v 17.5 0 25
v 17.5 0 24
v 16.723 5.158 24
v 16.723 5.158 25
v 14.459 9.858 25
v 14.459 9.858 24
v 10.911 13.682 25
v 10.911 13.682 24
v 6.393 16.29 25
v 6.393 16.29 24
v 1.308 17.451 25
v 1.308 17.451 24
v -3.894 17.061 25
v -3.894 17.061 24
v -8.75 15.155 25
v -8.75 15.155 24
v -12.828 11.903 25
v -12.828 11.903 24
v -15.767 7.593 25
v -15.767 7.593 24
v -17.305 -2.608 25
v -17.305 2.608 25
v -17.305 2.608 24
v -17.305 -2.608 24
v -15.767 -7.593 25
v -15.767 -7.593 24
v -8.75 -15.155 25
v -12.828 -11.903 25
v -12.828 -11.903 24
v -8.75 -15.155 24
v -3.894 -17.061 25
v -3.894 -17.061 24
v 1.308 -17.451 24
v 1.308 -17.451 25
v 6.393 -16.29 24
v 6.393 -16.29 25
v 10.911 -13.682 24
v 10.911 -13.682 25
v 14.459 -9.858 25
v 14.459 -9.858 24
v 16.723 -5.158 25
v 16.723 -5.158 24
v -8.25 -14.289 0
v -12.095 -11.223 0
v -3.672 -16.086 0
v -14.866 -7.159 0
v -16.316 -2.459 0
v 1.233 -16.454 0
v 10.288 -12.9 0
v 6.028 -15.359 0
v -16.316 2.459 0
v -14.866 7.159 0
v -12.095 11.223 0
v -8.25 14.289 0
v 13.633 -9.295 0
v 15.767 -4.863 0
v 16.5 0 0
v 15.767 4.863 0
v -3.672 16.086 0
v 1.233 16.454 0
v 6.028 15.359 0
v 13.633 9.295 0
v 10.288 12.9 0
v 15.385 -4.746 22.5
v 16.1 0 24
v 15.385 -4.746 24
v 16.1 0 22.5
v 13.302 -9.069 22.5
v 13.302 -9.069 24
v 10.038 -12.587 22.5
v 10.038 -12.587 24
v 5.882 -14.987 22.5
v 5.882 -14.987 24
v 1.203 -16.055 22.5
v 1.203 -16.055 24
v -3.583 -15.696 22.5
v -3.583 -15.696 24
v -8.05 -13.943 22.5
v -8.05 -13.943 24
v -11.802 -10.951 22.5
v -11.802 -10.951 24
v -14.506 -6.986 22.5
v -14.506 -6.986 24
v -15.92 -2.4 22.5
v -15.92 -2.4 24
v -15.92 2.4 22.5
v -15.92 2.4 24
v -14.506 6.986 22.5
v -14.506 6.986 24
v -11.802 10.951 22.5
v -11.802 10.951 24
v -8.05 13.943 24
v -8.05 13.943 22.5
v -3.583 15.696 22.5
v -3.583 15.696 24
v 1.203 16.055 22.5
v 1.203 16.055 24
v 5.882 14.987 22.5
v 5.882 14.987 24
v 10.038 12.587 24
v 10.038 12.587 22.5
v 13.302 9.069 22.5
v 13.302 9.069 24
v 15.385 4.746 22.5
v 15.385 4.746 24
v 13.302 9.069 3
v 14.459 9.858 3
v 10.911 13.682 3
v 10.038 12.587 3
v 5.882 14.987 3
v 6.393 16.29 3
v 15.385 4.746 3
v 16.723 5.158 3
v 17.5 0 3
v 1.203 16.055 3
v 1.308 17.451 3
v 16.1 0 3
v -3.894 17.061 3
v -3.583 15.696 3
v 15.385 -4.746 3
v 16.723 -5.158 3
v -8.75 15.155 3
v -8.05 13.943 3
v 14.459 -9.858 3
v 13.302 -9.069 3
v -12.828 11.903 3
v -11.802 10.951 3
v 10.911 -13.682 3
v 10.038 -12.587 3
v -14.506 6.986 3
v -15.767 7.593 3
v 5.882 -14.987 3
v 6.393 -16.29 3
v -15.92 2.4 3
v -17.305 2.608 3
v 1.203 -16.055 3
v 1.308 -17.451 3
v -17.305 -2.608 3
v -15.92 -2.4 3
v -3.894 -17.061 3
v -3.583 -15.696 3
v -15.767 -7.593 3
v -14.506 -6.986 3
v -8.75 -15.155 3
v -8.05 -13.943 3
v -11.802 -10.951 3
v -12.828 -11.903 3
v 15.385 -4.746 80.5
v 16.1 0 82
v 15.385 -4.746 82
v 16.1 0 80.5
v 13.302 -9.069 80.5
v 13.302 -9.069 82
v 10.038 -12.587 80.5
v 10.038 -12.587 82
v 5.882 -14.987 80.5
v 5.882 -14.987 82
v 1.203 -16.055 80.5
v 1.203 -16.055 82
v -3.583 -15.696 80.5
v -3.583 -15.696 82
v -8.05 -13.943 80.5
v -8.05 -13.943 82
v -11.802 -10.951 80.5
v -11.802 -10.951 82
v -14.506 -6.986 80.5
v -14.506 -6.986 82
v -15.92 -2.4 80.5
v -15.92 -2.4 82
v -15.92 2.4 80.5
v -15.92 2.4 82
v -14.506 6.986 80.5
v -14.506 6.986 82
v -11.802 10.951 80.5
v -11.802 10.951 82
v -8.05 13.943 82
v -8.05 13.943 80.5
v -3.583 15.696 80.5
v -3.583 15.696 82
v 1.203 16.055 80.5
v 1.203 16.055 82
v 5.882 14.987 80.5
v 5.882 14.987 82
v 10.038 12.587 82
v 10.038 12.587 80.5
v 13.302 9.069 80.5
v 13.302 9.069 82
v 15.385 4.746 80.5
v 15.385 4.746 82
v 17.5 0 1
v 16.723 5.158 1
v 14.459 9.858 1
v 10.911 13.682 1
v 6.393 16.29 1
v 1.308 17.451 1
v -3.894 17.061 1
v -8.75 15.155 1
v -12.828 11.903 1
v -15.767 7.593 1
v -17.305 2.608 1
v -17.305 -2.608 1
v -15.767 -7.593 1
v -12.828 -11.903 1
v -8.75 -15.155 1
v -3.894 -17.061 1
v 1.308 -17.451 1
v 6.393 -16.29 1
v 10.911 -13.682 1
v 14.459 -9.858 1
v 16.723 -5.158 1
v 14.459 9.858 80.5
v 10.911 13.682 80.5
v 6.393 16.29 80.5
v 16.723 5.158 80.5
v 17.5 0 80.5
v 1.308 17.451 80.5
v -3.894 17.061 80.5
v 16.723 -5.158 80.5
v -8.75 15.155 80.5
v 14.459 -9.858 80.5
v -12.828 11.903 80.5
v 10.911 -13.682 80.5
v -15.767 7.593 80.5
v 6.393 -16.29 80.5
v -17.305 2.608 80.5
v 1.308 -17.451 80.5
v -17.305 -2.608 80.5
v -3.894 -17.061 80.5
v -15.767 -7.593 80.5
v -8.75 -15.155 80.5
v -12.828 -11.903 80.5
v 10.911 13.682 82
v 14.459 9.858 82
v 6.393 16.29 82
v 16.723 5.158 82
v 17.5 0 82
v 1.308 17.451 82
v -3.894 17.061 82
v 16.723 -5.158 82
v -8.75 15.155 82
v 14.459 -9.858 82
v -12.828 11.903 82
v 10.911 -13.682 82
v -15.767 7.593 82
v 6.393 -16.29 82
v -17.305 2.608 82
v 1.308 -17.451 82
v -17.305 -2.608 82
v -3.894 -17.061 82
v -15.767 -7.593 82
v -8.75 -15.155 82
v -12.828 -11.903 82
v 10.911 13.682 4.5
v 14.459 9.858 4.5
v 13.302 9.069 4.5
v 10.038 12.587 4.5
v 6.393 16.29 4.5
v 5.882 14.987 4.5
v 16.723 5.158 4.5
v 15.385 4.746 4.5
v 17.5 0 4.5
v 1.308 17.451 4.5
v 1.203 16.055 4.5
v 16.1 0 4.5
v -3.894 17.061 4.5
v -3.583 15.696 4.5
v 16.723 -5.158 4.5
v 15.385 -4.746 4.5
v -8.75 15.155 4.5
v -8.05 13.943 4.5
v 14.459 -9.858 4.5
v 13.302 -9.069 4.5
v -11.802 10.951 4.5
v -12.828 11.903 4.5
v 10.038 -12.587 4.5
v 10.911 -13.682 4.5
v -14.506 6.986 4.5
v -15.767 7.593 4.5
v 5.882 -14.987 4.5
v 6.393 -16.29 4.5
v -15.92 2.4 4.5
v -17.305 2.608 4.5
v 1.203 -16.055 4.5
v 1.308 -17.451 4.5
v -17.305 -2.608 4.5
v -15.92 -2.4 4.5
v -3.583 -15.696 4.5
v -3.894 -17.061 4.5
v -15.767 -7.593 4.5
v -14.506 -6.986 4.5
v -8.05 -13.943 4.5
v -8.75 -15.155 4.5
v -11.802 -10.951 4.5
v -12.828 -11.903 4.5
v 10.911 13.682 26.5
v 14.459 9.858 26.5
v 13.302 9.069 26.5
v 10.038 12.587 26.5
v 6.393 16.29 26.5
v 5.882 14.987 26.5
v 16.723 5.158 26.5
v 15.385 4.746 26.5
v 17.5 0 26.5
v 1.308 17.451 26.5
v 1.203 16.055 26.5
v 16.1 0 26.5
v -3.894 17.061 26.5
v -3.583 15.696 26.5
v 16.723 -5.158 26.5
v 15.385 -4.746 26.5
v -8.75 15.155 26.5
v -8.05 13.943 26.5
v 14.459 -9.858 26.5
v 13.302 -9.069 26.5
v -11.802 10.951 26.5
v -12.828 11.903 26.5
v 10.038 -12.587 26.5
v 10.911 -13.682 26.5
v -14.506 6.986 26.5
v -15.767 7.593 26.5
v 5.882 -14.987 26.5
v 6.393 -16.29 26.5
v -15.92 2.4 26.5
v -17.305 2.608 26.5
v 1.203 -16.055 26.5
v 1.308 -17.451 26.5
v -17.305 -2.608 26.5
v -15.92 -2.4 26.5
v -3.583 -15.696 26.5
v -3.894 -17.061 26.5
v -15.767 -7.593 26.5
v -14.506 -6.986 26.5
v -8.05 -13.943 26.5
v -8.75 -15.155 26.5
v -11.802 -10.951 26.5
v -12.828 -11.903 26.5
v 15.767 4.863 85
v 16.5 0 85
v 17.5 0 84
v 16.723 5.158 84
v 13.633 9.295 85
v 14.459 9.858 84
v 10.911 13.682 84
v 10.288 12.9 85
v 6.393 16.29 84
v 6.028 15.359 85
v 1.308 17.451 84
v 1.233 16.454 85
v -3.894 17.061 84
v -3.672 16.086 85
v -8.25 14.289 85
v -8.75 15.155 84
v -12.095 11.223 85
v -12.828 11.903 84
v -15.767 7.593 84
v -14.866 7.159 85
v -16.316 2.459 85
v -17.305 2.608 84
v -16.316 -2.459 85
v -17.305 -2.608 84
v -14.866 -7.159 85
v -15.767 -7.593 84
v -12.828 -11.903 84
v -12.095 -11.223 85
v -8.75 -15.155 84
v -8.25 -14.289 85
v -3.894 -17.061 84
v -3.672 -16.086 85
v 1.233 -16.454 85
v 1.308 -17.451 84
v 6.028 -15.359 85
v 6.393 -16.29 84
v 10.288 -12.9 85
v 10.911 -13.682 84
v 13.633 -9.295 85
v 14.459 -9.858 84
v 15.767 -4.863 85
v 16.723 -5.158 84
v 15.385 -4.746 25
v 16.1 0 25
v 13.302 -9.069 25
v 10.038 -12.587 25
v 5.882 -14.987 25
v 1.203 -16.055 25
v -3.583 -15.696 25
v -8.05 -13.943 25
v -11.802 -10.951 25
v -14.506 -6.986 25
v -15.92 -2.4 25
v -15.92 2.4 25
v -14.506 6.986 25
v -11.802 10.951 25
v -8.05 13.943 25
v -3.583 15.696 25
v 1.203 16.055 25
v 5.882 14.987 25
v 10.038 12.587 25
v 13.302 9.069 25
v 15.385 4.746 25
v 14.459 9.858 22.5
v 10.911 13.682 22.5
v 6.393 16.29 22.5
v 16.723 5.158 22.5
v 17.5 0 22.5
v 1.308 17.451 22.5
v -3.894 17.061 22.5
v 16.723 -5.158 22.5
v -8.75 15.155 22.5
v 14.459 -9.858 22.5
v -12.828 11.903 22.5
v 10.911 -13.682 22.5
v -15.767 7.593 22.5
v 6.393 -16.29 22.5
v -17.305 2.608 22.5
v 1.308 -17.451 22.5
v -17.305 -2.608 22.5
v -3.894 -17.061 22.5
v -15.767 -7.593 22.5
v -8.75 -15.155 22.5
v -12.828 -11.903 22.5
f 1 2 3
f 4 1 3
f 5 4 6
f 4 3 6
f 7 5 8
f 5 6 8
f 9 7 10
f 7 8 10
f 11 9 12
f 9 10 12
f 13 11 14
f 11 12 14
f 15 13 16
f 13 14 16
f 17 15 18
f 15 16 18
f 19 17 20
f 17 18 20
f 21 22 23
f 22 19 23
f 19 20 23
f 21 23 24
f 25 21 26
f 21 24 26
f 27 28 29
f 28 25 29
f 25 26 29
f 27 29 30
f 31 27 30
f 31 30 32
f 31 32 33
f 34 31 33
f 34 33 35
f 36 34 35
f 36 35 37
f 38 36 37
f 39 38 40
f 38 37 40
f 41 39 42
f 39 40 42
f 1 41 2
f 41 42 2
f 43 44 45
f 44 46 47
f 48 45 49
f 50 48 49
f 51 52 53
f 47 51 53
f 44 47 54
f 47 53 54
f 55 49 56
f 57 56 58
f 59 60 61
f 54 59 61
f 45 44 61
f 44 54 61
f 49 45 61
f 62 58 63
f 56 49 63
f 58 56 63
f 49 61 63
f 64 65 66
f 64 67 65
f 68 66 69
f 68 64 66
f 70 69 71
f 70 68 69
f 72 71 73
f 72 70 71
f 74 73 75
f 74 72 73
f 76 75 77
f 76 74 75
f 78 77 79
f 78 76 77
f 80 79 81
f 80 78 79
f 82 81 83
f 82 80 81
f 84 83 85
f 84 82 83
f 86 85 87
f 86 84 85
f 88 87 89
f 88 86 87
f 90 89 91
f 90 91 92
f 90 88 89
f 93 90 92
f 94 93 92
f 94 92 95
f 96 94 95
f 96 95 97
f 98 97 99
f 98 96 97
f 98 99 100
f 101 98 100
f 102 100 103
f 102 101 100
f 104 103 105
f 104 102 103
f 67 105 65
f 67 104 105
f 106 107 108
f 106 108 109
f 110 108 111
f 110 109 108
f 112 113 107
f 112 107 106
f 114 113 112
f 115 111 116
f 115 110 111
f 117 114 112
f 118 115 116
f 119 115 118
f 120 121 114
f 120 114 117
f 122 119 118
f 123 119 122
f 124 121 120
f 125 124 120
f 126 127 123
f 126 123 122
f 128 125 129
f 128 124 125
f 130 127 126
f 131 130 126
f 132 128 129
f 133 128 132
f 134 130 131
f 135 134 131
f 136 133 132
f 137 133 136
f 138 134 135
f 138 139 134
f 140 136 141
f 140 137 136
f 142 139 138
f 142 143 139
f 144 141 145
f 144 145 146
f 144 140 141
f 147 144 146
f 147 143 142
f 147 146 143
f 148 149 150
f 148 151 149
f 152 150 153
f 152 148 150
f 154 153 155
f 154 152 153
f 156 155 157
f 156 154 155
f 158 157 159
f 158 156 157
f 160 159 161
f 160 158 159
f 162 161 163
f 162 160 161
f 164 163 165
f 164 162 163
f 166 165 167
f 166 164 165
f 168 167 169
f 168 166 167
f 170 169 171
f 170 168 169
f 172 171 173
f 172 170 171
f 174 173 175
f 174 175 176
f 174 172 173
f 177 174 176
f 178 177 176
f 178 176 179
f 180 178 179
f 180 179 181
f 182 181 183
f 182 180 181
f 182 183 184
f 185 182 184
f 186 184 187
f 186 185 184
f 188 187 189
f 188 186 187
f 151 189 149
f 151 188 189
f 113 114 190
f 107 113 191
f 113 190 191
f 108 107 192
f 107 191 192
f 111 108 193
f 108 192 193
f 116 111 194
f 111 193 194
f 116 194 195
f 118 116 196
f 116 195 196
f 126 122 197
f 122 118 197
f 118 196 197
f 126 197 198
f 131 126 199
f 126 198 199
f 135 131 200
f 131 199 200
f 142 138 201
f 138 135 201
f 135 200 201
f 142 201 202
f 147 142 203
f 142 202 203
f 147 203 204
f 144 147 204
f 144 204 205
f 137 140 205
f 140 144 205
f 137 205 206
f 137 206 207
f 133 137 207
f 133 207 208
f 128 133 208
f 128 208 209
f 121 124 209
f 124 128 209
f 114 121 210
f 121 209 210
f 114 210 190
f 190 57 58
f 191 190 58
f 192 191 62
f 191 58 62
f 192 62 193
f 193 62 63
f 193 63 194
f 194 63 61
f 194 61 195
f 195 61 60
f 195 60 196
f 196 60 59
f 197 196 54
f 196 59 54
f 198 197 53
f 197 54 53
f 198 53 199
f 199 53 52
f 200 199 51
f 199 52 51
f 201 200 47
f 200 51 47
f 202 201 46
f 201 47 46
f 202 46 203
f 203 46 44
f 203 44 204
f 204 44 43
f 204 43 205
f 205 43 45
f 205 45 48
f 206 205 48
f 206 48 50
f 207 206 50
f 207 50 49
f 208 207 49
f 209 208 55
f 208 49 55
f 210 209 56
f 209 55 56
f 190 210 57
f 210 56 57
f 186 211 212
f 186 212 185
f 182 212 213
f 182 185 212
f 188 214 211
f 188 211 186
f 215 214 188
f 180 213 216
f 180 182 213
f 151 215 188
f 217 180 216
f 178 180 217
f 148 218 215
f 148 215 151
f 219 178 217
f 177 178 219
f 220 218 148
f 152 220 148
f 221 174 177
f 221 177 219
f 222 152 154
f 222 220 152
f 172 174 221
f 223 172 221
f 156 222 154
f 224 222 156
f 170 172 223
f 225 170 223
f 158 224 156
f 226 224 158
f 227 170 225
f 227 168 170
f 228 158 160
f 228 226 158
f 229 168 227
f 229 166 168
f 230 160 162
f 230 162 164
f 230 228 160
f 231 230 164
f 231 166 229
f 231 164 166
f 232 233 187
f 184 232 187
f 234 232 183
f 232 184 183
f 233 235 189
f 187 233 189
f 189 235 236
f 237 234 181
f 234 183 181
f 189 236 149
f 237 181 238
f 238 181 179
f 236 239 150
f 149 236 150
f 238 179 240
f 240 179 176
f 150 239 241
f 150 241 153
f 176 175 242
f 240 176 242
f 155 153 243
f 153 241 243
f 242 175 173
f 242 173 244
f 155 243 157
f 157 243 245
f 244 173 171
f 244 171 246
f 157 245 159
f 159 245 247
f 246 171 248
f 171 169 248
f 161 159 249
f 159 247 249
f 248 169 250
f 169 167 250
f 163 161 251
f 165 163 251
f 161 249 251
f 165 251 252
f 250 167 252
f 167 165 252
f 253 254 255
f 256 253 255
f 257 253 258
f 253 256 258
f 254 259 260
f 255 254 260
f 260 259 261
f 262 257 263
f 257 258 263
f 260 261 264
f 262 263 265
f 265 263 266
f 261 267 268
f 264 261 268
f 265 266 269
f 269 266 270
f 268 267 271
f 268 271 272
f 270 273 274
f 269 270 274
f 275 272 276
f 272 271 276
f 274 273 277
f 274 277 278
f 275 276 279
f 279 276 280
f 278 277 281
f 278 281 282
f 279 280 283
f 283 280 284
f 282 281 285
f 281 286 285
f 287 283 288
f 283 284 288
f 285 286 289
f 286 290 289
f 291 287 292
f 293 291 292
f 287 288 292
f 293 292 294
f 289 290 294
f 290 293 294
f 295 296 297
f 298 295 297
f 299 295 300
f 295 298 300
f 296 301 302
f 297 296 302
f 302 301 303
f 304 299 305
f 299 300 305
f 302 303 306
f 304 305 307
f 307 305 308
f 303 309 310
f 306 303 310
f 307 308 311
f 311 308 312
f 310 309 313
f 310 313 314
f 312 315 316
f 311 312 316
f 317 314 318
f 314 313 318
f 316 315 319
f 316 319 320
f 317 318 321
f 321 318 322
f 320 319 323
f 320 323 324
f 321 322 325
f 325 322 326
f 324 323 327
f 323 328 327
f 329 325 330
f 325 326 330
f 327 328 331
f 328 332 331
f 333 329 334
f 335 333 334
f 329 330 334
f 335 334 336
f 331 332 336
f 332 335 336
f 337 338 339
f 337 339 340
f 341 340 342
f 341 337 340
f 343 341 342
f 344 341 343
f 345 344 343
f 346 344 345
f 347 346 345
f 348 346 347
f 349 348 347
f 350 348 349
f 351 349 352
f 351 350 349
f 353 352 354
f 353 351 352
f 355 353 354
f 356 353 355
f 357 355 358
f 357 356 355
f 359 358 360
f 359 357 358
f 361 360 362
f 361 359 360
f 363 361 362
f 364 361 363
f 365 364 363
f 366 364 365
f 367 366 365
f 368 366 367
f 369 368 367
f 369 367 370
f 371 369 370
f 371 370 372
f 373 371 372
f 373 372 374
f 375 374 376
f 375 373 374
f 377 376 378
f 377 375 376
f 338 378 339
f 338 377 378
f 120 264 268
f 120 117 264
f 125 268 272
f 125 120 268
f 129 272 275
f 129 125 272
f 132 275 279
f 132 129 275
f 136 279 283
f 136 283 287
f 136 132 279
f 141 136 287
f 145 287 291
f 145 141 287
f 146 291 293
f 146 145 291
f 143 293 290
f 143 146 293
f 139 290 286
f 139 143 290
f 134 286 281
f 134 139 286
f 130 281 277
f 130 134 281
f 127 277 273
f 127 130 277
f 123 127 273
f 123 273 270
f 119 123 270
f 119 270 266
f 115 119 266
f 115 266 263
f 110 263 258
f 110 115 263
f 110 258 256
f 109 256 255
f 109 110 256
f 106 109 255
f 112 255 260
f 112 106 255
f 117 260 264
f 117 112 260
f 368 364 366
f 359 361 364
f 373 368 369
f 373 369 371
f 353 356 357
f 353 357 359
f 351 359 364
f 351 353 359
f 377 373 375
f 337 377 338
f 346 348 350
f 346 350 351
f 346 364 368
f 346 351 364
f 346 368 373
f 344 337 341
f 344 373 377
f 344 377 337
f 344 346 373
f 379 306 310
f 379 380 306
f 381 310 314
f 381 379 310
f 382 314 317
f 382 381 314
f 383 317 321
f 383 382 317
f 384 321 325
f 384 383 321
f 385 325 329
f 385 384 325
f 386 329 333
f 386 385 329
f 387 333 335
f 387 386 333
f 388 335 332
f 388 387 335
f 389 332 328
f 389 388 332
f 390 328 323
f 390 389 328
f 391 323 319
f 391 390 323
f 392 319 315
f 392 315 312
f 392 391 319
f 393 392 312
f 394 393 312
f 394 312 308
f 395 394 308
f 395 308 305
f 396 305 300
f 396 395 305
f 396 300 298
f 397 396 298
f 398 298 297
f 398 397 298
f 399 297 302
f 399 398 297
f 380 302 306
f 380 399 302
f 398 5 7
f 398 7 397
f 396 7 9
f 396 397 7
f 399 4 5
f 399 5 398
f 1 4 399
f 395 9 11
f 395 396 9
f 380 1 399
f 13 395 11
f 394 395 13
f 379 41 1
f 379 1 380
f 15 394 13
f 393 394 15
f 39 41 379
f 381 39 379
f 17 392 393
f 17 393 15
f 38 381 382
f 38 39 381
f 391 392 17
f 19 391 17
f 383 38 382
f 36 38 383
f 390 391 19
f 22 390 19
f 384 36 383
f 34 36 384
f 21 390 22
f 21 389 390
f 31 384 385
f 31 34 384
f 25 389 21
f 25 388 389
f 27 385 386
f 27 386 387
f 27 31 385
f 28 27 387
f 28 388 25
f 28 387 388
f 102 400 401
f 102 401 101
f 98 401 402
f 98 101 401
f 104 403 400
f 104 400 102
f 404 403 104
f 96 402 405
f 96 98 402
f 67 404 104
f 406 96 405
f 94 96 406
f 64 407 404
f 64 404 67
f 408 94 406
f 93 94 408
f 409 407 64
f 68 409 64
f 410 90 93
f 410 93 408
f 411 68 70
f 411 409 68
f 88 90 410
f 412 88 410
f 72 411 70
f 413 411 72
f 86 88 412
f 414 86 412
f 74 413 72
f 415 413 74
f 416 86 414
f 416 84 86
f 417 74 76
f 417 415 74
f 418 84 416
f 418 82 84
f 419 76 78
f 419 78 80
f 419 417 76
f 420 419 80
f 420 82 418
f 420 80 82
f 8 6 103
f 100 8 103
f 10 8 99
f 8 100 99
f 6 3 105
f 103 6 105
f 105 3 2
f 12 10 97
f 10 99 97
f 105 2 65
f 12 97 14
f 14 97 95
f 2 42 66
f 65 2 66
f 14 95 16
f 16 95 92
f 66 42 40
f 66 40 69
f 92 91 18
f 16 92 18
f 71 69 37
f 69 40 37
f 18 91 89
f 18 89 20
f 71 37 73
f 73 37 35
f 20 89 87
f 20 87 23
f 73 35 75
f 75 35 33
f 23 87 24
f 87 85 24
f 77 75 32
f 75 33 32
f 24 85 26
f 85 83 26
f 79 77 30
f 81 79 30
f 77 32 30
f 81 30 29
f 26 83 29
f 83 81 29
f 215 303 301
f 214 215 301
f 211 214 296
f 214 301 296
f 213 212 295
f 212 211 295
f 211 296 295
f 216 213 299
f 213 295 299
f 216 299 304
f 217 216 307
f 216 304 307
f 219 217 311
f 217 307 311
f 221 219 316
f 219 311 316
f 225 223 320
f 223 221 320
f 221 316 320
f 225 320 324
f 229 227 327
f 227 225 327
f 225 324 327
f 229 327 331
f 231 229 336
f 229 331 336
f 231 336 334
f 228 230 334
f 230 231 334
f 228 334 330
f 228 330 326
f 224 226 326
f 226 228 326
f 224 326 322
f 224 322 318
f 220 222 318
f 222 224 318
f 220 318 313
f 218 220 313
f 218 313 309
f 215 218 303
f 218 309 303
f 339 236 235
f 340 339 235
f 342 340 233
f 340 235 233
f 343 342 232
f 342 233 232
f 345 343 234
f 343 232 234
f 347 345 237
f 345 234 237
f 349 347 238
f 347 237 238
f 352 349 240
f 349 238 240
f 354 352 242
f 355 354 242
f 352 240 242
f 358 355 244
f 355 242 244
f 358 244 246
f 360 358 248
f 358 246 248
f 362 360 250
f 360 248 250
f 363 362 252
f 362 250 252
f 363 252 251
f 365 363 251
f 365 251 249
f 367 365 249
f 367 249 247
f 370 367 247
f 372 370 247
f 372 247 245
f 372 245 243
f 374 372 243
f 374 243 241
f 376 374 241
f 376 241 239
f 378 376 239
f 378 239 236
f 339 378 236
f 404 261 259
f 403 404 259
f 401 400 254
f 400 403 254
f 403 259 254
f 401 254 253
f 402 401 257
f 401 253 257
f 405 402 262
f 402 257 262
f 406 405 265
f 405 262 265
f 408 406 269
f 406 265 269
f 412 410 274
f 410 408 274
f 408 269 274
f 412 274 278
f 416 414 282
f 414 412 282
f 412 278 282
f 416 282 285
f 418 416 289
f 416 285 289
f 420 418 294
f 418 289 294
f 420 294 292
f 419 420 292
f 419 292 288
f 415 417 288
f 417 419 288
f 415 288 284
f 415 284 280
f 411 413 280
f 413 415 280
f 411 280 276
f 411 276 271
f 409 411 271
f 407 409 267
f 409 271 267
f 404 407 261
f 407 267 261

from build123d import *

# Parameters (mm, degrees)
SKETCH1_R     = 17.5
BODY_DEPTH    = 85
SKETCH2_W     = 1.5
SKETCH2_H     = 1.4
CHAMFER1_SIZE = 1


with BuildPart() as part:
    # Sketch1 → Body (new body)
    with BuildSketch(Plane.XY):
        Circle(SKETCH1_R)
    extrude(amount=BODY_DEPTH)

    # Sketch2 → Ret Ring Grooves (revolve, cut)
    with BuildSketch(Plane(origin=(0, 0, 0), x_dir=(0, 0, -1), z_dir=(1, 0, 0)), mode=Mode.PRIVATE) as ret_ring_grooves_sk:
        with Locations((-3.75, 16.8)):
            Rectangle(SKETCH2_W, SKETCH2_H)
        with Locations((-23.25, 16.8)):
            Rectangle(SKETCH2_W, SKETCH2_H)
        with Locations((-25.75, 16.8)):
            Rectangle(SKETCH2_W, SKETCH2_H)
        with Locations((-81.25, 16.8)):
            Rectangle(SKETCH2_W, SKETCH2_H)
    revolve(ret_ring_grooves_sk.sketch.rotate(Axis((0, 0, 85), (0, 0, -1)), 90), axis=Axis((0, 0, 85), (0, 0, -1)), mode=Mode.SUBTRACT)

    # Chamfer1
    chamfer1_edges = [part.edges().sort_by_distance(p)[0] for p in [
        (-17.5, 0, 0),
        (-17.5, 0, 85),
    ]]
    chamfer(chamfer1_edges, length=CHAMFER1_SIZE)


solid = part.part
